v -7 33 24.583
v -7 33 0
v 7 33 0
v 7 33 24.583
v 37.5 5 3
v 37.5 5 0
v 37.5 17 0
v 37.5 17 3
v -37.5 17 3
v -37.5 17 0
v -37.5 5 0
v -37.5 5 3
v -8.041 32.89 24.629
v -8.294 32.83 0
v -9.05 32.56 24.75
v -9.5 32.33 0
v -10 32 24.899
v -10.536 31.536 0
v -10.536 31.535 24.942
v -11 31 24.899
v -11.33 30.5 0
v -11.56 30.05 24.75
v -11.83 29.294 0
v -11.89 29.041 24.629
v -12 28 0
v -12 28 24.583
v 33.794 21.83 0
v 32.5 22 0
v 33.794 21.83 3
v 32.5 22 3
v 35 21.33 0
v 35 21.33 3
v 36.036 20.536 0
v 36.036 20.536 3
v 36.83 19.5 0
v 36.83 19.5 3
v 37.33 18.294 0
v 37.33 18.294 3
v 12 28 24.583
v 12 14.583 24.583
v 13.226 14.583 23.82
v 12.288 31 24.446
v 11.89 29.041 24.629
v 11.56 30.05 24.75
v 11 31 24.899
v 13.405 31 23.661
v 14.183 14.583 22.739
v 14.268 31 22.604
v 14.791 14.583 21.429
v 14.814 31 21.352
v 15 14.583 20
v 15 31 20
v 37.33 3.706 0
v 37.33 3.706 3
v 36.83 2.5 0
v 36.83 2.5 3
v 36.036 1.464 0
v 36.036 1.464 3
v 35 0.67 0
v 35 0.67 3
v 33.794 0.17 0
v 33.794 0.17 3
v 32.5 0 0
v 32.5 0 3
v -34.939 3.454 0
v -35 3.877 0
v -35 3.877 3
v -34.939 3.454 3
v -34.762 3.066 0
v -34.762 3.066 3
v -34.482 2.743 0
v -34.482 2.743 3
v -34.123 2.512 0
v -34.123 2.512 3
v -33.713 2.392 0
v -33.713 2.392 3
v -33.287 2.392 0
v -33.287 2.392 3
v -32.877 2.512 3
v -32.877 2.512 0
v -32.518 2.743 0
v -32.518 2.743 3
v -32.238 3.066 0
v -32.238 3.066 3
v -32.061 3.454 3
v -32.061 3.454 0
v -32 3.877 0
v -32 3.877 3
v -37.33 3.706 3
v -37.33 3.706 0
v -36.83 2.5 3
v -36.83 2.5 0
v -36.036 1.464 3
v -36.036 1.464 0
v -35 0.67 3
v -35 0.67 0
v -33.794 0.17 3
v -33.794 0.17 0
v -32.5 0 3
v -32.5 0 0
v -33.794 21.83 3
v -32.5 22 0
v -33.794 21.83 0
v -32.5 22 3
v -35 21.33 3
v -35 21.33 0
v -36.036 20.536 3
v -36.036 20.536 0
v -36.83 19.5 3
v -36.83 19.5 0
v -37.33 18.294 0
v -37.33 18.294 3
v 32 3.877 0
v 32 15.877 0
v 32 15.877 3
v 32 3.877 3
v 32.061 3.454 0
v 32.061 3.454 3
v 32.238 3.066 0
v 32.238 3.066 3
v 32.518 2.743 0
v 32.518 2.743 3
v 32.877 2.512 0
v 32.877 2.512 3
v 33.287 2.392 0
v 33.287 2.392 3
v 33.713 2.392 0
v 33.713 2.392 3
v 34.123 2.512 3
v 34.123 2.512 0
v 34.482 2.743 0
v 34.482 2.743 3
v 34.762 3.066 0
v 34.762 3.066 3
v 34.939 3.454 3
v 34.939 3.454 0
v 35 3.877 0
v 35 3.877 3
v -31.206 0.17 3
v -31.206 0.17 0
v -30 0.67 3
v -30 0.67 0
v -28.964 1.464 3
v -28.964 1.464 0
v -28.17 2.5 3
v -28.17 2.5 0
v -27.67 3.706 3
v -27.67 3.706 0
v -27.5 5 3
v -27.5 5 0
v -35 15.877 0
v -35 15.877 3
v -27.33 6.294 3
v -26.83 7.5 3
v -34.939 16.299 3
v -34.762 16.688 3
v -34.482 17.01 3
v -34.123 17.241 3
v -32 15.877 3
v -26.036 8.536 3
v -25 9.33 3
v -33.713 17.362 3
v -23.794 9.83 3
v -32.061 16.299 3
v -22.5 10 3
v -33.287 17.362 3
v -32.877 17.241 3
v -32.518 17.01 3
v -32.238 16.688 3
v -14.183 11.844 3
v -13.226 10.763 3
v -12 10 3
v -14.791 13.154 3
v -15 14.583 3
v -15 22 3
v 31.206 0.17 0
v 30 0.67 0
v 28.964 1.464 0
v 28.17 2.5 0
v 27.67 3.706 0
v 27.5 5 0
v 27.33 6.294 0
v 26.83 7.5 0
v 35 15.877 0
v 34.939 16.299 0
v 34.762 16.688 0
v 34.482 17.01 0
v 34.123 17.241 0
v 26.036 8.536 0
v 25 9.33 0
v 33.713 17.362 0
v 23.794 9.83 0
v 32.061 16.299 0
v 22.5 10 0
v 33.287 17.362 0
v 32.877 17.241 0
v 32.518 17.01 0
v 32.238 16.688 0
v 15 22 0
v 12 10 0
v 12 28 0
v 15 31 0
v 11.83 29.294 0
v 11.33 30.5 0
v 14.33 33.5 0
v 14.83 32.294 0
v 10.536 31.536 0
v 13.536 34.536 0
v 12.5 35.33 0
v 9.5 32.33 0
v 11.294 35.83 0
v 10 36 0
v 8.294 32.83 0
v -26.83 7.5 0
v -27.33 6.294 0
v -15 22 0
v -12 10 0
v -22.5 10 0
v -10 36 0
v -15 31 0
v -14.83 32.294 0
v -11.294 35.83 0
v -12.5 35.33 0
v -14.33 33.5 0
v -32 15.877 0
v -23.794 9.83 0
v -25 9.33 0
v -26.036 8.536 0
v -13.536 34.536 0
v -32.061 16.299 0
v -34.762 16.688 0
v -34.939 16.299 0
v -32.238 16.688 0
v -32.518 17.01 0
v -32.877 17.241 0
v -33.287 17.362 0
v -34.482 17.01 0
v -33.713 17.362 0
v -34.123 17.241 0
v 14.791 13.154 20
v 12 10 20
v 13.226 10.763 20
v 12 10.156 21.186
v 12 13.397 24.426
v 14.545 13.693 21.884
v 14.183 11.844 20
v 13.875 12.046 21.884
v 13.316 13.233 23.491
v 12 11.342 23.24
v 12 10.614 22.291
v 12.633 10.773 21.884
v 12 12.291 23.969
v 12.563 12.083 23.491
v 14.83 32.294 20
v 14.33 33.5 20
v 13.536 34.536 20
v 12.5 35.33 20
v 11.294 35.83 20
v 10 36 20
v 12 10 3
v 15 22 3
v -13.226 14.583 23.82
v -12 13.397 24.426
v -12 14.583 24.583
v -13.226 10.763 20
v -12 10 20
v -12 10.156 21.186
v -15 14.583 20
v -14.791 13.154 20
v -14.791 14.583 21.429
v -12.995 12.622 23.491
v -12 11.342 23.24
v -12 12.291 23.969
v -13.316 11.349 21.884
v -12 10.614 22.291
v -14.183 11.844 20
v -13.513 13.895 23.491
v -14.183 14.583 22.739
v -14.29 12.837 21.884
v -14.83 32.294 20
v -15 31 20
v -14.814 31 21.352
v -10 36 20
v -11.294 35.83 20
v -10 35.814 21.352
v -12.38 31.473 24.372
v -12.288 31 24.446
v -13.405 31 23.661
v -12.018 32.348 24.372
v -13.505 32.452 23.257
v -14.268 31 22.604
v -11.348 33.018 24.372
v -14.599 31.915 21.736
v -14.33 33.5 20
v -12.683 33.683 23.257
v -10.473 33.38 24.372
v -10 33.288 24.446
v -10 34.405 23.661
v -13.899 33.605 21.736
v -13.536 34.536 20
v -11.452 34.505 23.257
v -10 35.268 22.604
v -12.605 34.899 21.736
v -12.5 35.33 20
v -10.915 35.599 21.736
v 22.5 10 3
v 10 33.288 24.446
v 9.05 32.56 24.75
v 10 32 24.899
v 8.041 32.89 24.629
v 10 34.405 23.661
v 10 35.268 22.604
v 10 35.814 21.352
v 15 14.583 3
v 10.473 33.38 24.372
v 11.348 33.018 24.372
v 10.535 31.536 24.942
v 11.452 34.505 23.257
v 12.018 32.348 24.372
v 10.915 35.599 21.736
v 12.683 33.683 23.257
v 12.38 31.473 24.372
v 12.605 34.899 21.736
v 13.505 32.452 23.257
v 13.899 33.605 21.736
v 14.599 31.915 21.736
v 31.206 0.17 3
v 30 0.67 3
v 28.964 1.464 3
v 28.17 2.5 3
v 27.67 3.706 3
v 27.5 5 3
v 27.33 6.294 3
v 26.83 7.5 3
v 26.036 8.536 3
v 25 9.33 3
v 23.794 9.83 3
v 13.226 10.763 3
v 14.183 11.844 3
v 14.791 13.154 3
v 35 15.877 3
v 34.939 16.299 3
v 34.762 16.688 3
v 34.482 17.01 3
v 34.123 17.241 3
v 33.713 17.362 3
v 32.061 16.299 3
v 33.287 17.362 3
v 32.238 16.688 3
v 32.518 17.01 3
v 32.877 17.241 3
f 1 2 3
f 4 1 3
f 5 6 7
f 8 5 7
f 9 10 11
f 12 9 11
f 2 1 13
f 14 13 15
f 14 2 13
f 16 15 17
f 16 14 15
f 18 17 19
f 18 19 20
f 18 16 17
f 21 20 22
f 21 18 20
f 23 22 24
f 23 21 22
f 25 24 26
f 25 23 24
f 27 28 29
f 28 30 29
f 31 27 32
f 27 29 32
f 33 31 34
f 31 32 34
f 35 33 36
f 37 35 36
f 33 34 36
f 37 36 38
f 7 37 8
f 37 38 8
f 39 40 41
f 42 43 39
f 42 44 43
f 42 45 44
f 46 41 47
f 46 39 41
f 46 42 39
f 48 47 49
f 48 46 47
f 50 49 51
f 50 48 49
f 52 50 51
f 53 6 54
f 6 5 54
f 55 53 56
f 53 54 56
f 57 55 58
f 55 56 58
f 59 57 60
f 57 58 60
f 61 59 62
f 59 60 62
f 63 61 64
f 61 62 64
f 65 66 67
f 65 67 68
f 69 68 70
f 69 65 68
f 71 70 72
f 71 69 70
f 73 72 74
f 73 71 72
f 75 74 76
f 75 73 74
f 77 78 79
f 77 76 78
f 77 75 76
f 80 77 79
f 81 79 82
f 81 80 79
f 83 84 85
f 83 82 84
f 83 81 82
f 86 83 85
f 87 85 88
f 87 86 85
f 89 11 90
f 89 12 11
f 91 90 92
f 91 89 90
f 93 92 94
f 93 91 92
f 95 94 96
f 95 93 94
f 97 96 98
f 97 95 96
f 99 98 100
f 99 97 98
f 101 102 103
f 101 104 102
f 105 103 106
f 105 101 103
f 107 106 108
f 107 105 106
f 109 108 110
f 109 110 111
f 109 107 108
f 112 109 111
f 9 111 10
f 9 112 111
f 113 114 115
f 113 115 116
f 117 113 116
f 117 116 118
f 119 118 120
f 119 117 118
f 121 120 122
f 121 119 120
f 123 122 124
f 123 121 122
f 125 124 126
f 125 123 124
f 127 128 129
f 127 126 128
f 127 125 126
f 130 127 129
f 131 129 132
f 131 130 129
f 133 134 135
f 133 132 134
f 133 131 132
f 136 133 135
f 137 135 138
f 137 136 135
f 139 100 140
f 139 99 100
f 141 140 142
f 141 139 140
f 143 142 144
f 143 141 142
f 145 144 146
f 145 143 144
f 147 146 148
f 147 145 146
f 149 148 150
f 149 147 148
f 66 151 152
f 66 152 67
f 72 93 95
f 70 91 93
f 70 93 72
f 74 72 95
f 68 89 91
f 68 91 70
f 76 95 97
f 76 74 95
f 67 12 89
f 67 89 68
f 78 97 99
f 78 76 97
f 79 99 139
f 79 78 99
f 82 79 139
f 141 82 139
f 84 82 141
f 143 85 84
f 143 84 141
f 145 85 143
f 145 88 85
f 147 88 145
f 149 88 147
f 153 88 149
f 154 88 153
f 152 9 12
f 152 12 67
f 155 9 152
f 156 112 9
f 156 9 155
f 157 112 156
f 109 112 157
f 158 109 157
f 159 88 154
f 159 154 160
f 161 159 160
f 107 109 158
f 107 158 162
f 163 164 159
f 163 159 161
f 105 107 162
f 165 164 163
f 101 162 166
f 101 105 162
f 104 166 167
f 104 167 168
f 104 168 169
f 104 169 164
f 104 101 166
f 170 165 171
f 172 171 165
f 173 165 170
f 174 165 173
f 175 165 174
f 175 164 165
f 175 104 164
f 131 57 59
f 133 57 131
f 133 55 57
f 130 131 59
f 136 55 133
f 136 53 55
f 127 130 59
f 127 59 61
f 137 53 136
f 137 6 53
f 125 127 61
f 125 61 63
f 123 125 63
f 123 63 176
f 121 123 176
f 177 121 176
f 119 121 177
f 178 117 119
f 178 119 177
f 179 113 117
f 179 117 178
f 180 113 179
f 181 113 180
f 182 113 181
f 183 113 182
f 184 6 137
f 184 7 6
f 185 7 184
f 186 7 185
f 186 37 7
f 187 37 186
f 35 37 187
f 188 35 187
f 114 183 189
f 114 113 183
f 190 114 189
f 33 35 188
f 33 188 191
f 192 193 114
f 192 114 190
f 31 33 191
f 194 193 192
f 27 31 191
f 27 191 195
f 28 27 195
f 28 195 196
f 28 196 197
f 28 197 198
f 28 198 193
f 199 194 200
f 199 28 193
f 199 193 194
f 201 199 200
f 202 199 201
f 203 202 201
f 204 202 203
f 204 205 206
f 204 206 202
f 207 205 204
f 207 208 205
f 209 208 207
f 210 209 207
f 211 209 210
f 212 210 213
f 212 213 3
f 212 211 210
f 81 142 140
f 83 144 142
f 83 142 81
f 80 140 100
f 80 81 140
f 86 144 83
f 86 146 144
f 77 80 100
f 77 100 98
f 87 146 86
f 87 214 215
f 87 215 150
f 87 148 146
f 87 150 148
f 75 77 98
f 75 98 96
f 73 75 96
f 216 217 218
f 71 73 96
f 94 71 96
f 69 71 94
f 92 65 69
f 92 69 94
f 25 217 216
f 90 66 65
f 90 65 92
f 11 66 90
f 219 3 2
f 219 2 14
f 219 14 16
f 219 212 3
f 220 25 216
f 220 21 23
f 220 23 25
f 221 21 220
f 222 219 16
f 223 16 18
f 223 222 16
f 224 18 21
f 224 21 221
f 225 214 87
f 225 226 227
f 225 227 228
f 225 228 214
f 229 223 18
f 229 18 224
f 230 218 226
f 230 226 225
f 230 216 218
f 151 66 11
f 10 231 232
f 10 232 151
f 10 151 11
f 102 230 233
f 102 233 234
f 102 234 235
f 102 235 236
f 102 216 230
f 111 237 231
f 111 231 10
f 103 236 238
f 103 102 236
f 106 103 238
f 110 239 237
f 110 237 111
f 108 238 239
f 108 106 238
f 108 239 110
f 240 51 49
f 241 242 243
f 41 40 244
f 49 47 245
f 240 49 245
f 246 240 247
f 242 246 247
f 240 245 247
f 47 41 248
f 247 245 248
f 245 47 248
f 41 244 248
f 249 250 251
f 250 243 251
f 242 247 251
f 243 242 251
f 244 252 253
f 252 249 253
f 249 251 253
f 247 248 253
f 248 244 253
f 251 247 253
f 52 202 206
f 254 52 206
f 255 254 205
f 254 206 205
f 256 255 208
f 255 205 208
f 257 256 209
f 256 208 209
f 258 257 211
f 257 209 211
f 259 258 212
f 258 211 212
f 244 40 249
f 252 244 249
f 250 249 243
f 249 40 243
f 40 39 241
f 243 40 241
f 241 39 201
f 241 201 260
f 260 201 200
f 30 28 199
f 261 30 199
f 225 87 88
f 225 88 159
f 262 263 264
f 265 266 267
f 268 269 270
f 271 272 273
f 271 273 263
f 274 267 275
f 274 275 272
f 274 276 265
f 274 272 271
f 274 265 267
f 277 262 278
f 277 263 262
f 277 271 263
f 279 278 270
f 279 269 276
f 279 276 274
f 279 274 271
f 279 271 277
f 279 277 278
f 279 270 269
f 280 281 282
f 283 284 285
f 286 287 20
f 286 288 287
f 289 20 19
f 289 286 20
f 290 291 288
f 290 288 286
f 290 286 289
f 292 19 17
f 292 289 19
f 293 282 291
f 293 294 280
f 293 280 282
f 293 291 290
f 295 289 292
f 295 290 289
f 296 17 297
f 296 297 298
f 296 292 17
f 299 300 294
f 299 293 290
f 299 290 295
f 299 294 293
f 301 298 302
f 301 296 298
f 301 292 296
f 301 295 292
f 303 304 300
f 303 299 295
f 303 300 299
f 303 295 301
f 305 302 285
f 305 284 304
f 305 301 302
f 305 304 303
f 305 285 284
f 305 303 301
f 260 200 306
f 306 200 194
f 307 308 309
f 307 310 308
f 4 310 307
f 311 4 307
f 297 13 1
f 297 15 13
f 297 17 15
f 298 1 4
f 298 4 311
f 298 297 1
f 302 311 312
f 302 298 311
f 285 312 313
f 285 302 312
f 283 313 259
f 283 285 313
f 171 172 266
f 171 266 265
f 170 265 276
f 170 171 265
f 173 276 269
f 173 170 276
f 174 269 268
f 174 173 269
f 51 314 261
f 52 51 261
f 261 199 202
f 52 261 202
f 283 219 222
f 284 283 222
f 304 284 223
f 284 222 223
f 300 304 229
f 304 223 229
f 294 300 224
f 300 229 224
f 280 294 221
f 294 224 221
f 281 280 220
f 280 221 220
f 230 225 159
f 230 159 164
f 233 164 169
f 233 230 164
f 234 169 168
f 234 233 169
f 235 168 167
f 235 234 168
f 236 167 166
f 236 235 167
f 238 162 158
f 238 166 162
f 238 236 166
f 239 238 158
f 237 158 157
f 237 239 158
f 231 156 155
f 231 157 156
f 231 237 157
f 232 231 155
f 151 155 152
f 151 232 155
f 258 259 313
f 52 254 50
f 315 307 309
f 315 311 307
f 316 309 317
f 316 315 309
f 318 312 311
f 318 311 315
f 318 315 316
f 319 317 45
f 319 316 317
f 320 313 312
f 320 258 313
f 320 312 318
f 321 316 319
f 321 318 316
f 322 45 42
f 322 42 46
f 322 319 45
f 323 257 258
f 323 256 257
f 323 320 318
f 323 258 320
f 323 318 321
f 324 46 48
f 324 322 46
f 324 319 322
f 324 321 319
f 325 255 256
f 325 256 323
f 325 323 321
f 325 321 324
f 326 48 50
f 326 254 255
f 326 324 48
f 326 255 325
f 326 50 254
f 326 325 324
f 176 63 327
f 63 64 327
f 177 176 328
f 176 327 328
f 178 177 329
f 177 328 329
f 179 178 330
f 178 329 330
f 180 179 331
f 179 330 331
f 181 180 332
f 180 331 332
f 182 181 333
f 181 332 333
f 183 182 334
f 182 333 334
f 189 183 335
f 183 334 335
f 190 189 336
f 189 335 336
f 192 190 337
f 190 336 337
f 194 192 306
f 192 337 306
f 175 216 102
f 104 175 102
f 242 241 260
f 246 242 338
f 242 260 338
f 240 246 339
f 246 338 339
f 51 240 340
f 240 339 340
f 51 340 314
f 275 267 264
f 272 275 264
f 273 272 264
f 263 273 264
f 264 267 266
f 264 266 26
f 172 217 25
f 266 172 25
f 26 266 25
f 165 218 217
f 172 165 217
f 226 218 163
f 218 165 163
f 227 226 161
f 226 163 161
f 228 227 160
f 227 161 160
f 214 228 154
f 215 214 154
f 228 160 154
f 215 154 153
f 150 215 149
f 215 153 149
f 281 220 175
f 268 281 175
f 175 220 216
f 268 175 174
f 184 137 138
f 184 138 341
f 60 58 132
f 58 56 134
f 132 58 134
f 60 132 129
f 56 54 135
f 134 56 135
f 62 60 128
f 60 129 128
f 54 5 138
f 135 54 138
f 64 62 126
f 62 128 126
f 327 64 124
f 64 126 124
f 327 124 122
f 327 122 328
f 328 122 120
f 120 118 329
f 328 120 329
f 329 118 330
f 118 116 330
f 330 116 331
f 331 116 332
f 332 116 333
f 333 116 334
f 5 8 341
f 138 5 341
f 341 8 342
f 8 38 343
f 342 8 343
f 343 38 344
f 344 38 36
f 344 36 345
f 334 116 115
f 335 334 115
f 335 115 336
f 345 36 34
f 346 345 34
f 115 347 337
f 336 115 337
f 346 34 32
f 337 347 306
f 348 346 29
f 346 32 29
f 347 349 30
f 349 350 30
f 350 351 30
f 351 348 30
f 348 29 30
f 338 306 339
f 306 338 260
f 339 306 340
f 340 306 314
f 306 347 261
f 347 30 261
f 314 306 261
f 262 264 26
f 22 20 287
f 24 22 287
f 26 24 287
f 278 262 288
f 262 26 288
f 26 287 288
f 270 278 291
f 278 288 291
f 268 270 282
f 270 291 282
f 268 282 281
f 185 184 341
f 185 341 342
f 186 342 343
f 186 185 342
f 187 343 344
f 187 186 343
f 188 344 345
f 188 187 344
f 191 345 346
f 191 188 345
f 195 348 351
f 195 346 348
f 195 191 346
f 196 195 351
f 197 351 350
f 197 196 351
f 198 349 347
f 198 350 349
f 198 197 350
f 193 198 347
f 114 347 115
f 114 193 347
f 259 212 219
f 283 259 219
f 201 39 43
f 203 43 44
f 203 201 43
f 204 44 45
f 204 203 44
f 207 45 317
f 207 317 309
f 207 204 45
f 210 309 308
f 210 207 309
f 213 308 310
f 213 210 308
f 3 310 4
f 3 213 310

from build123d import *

# Parameters (mm, degrees)
F2_DEPTH     = 25
F3_DEPTH     = 3
F4_DEPTH     = 25
F5_R         = 4.99999
F6_T1_DEPTH  = 25
F6_T3_DEPTH  = 25
F6_T5_DEPTH  = 50
F6_T7_DEPTH  = 33.4564392374
F6_T9_DEPTH  = 50
F6_T11_DEPTH = 33.4564392374
F7_T1_DEPTH  = 16.417424305
F7_T3_DEPTH  = 20
F7_T6_ANGLE  = 89.9999999974
F7_T8_ANGLE  = 89.9999999974
F7_T10_ANGLE = 209.6926070845
F7_T12_ANGLE = 209.6926070845


# Not quite as in the source:
# - a fillet or chamfer that OpenCascade refuses, or shapes differently, is made with other operations: its cross-section is extruded or revolved along the edge and cut away or added
# - a fillet or chamfer is up to 0.001 mm smaller than in the source, because OpenCascade refuses the exact size


with BuildPart() as f2:
    # F0 (on Top) → F2 (new body)
    with BuildSketch(Plane.XY):
        Polygon((15, 36), (0, 36), (-15, 36), (-15, 22), (-15, 10), (-12, 10), (-12, 33), (0, 33), (12, 33), (12, 10), (15, 10), (15, 22), align=None)
    extrude(amount=F2_DEPTH)

    # F0 (on Top) → F3 (join)
    with BuildSketch(Plane.XY):
        Polygon((-15, 10), (-15, 22), (-37.5, 22), (-37.5, 0), (-27.5, 0), (-27.5, 10), align=None)
        Polygon((37.5, 22), (15, 22), (15, 10), (27.5, 10), (27.5, 0), (37.5, 0), align=None)
    extrude(amount=F3_DEPTH)

    # F1 (on Top) → F4 (cut)
    with BuildSketch(Plane.XY):
        with BuildLine():
            Line((35, 3.8767794613), (35, 15.8767794613))
            ThreePointArc((35, 15.8767794613), (33.5, 17.3767794613), (32, 15.8767794613))
            Line((32, 15.8767794613), (32, 3.8767794613))
            ThreePointArc((32, 3.8767794613), (33.5, 2.3767794613), (35, 3.8767794613))
        make_face()
        with BuildLine():
            ThreePointArc((-32, 15.8767794613), (-33.5, 17.3767794613), (-35, 15.8767794613))
            Line((-35, 15.8767794613), (-35, 3.8767794613))
            ThreePointArc((-35, 3.8767794613), (-33.5, 2.3767794613), (-32, 3.8767794613))
            Line((-32, 3.8767794613), (-32, 15.8767794613))
        make_face()
    extrude(amount=F4_DEPTH, mode=Mode.SUBTRACT)

    # F5 (radius 5 in the source; OpenCascade refuses exactly that, so slightly less here)
    f5_edges = [f2.edges().sort_by_distance(p)[0] for p in [
        (-37.5, 0, 1.5),
        (-27.5, 0, 1.5),
        (-37.5, 22, 1.5),
        (37.5, 22, 1.5),
        (37.5, 0, 1.5),
        (27.5, 0, 1.5),
        (27.5, 10, 1.5),
        (-27.5, 10, 1.5),
    ]]
    fillet(f5_edges, radius=F5_R)

    # F6: fillet of radius 5 on 6 edges, made by hand

    # F6_s2 → F6_t1 (join)
    with BuildSketch(Plane.XY):
        with BuildLine():
            ThreePointArc((12, 28), (10.5355339059, 31.5355339059), (7, 33))
            Line((7, 33), (12, 33))
            Line((12, 33), (12, 28))
        make_face()
    extrude(amount=F6_T1_DEPTH)

    # F6_s4 → F6_t3 (join)
    with BuildSketch(Plane.XY):
        with BuildLine():
            ThreePointArc((-7, 33), (-10.5355339059, 31.5355339059), (-12, 28))
            Line((-12, 28), (-12, 33))
            Line((-12, 33), (-7, 33))
        make_face()
    extrude(amount=F6_T3_DEPTH)

    # F6_s6 → F6_t5 (cut)
    with BuildSketch(Plane.XY.offset(-12.5)):
        with BuildLine():
            ThreePointArc((15, 31), (13.5355339059, 34.5355339059), (10, 36))
            Line((10, 36), (15, 36))
            Line((15, 36), (15, 31))
        make_face()
    extrude(amount=F6_T5_DEPTH, mode=Mode.SUBTRACT)

    # F6_s8 → F6_t7 (cut)
    with BuildSketch(Plane.XY.offset(3)):
        with BuildLine():
            ThreePointArc((12, 10), (14.1833001327, 11.8439629074), (15, 14.582575695))
            Line((15, 14.582575695), (15, 10))
            Line((15, 10), (12, 10))
        make_face()
    extrude(amount=F6_T7_DEPTH, mode=Mode.SUBTRACT)

    # F6_s10 → F6_t9 (cut)
    with BuildSketch(Plane.XY.offset(-12.5)):
        with BuildLine():
            ThreePointArc((-10, 36), (-13.5355339059, 34.5355339059), (-15, 31))
            Line((-15, 31), (-15, 36))
            Line((-15, 36), (-10, 36))
        make_face()
    extrude(amount=F6_T9_DEPTH, mode=Mode.SUBTRACT)

    # F6_s12 → F6_t11 (cut)
    with BuildSketch(Plane.XY.offset(3)):
        with BuildLine():
            ThreePointArc((-12, 10), (-14.1833001327, 11.8439629074), (-15, 14.582575695))
            Line((-15, 14.582575695), (-15, 10))
            Line((-15, 10), (-12, 10))
        make_face()
    extrude(amount=F6_T11_DEPTH, mode=Mode.SUBTRACT)

    # F7: fillet of radius 5 on 3 edges, made by hand

    # F7_s2 → F7_t1 (cut)
    with BuildSketch(Plane.XZ.offset(-31)):
        with BuildLine():
            ThreePointArc((-10, 25), (-13.5355339059, 23.5355339059), (-15, 20))
            Line((-15, 20), (-15, 25))
            Line((-15, 25), (-10, 25))
        make_face()
        with BuildLine():
            ThreePointArc((10, 25), (13.5355339059, 23.5355339059), (15, 20))
            Line((15, 20), (15, 25))
            Line((15, 25), (10, 25))
        make_face()
    extrude(amount=F7_T1_DEPTH, mode=Mode.SUBTRACT)

    # F7_s4 → F7_t3 (cut)
    with BuildSketch(Plane.YZ.offset(-10)):
        with BuildLine():
            ThreePointArc((31, 25), (34.5355339059, 23.5355339059), (36, 20))
            Line((36, 20), (36, 25))
            Line((36, 25), (31, 25))
        make_face()
    extrude(amount=F7_T3_DEPTH, mode=Mode.SUBTRACT)

    # F7_s5 → F7_t6 (revolve, cut)
    with BuildSketch(Plane.YZ.offset(9.9999999999)):
        with BuildLine():
            ThreePointArc((31, 25), (34.5355339059, 23.5355339059), (36, 20))
            Line((36, 20), (36, 25))
            Line((36, 25), (31, 25))
        make_face()
    revolve(axis=Axis((9.9999999999, 30.9999999999, 25), (0, 0, -1)), revolution_arc=F7_T6_ANGLE, mode=Mode.SUBTRACT)

    # F7_s7 → F7_t8 (revolve, cut)
    with BuildSketch(Plane.XZ.offset(-30.9999999999)):
        with BuildLine():
            ThreePointArc((-10, 25), (-13.5355339059, 23.5355339059), (-15, 20))
            Line((-15, 20), (-15, 25))
            Line((-15, 25), (-10, 25))
        make_face()
    revolve(axis=Axis((-9.9999999999, 30.9999999999, 25), (0, 0, -1)), revolution_arc=F7_T8_ANGLE, mode=Mode.SUBTRACT)

    # F7_s9 → F7_t10 (revolve, cut)
    with BuildSketch(Plane.XZ.offset(-14.5825756948)):
        with BuildLine():
            ThreePointArc((15, 20), (13.5355339059, 23.5355339059), (10, 25))
            Line((10, 25), (15, 25))
            Line((15, 25), (15, 20))
        make_face()
    revolve(axis=Axis((10.0000000002, 14.5825756948, 25), (0, 0, -1)), revolution_arc=F7_T10_ANGLE, mode=Mode.SUBTRACT)

    # F7_s11 → F7_t12 (revolve, cut)
    with BuildSketch(Plane(origin=(-8.7286422437, 15.307527957, 0), x_dir=(0, 0, 1), z_dir=(-0.4953465841, 0.8686954366, 0))):
        with BuildLine():
            ThreePointArc((25, -1.4635253083), (23.5355339059, 2.0720085977), (20, 3.5364746917))
            Line((20, 3.5364746917), (25, 3.5364746917))
            Line((25, 3.5364746917), (25, -1.4635253083))
        make_face()
    revolve(axis=Axis((-10.0000000002, 14.5825756948, 25), (0, 0, -1)), revolution_arc=F7_T12_ANGLE, mode=Mode.SUBTRACT)


solid = f2.part
